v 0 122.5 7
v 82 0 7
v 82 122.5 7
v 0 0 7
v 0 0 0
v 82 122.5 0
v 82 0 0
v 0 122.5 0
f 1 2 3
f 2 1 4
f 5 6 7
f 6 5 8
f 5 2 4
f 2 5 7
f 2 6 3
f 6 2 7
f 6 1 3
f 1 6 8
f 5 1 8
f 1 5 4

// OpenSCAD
// file: ../lib/config/assert_helpers.scad
// true if each item of the list passes the check function
// e.g. 
// is_list_of(card_stack_list, is_card_stack);
//
function is_list_of(list, check_fn) = is_list(list)
  && is_function(check_fn)
  && [for(item=list) true] == [for(item=list) check_fn(item)];

// true if size is an array of 3 numbers used to size a cube 
// e.g. 
// is_cube_size([5, 5, 5]);
function is_cube_size(size) = is_num(size[0]) && is_num(size[1]) && is_num(size[2]);
// file: ../lib/config/card_sizes.scad
include <./assert_helpers.scad>

// 10 cards -> 3mm -> 0.3
// 20 cards -> 6mm
// 30 cards -> 9mm
// 40 cards -> 12mm
// 50 cards -> 15.5mm -> 0.31
// 60 cards -> 18.8mm -> 0.31333
// 70 cards -> 22mm -> 0.314285
// 80 cards -> 25mm
// 90 cards -> 29mm -> 0.32222 per card -> 0.323
// taking the worst case since they are all so close
card_thickness = 0.323; 
card_stack_height = function(card_count) card_count * card_thickness;

// 15 small cards -> 11mm -> 0.733r per card
// 22 cards -> 15mm -> 0.68 per card
// 36 cards -> 24mm -> 0.66r per card
// 60 cards -> 35mm -> 0.5833 per card -> 0.584
// put these numbers into: https://mycurvefit.com/
// to get card thickness maths, it probably should be much simpler
function sleeved_card_thickness(card_count) = -349.9101 + (0.8433182 - -349.9101)/(1 + (card_count/32688540)^0.5466091);
sleeved_card_stack_height = function(card_count) round(card_count * sleeved_card_thickness(card_count));

function is_card_size(card_size) = is_num(card_size[0]) 
  && is_num(card_size[1]) 
  && is_function(card_size[2]);

// a card stack is just a card size and a stack count
// e.g. [mini_euro_card_size, 10] -> a stack of 10 mini euro cards
function is_card_stack(card_stack) = is_card_size(card_stack[0]) && is_num(card_stack[1]);
is_card_stack_fn = function(card_stack) is_card_size(card_stack[0]) && is_num(card_stack[1]);

function is_card_stack_list(card_stack_list) = is_list_of(card_stack_list, is_card_stack_fn);

function is_valid_orientation(orientation) = orientation == "back" || orientation == "side";
function orient_card_cube_size(card_size, orientation = "back") = 
  assert(is_valid_orientation(orientation), orientation)
  orientation == "back" 
    ? card_size 
    : orientation == "side" 
      ? [card_size[2], card_size[1], card_size[0]] 
      : undef;

function card_cube_size(card_stack, orientation = "back") = 
  assert(is_card_stack(card_stack), card_stack)
  let(card_size = card_stack[0], stack_count = card_stack[1])
  orient_card_cube_size([card_size[0], card_size[1], card_size[2](stack_count)], orientation);

/**
 * Mini european size eg The crew tasks
 */
mini_euro_card_size = [
  44,
  68,
  card_stack_height,
];

/**
 * Mini european size eg The crew tasks
 * Sleeved with Mayday (blue)
 */
mini_euro_sleeved_card_size = [
  47,
  70,
  sleeved_card_stack_height,
];

/**
 * Standard card size eg MTG
 */
standard_card_size = [
  63,
  88,
  card_stack_height,
];

/**
 * Standard card size eg MTG
 * Sleeved with either gamegenic gray or TODO find mayday colour and double check size
 */
standard_sleeved_card_size = [
  67,
  91.5,
  sleeved_card_stack_height,
];

/**
 * Standard USA card size
 * - Bohnanza
 * - Food Chain Magnate
 * - The Crew
 */
standard_usa_card_size = [
  56,
  87,
  card_stack_height,
];

/**
 * Standard USA card size sleeved with mayday chimera (orange)
 *
 * WARNING: mayday sleeves vary in dimensions
 *          be sure to test large prints first
 *
 * - Bohnanza
 * - Food Chain Magnate
 * - The Crew
 */
standard_usa_sleeved_card_size = [
  59.5,
  91,
  sleeved_card_stack_height,
];

/**
 * Large 80/120
 *
 * - Dixit
 */
large_80_120_card_size = [
  80,
  120,
  card_stack_height,
];

/**
 * Large 80/120 sleeved with Mayday Magnum gold / dixit
 *
 * WARNING: mayday sleeves vary in dimensions
 *          be sure to test large prints first
 *
 * - Dixit
 */
large_80_120_sleeved_card_size = [
  82,
  122.5,
  sleeved_card_stack_height,
];
// main file
include <../lib/config/card_sizes.scad>

wall_thickness = 1.5; // possible minimumn possible wall thickness
card_padding = 2; // aiming for snug fit

card_box_size = card_cube_size([large_80_120_sleeved_card_size, 10]);

cube(card_box_size);

sleeved_card_stack_height_cases = [
  [15, 11],
  [22, 15],
  [36, 24],
  [60, 35],
];
for (case=sleeved_card_stack_height_cases) {
  let(
    height = sleeved_card_stack_height(case[0]),
    diff = abs(case[1] - height)
  ) {
    assert(diff <= 1, case);
  }
}
